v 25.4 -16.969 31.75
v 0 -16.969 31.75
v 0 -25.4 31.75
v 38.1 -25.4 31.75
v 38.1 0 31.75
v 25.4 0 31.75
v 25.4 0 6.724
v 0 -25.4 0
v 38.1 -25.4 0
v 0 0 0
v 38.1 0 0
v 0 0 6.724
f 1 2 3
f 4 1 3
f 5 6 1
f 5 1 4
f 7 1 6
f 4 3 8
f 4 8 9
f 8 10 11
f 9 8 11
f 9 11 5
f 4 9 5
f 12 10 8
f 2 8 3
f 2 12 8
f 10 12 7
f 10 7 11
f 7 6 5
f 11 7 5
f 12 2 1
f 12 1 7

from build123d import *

# Parameters (mm, degrees)
F0_W     = 38.1
F0_H     = 31.75
F1_DEPTH = 25.4
F3_DEPTH = 25.4
F4_DEPTH = 0.0543467271


with BuildPart() as f1:
    # F0 (on Front) → F1 (new body)
    with BuildSketch(Plane.XZ):
        with Locations((19.05, 15.875)):
            Rectangle(F0_W, F0_H)
    extrude(amount=F1_DEPTH)

    # F2 (on Right) → F3 (cut)
    with BuildSketch(Plane.YZ):
        Polygon((0, 31.696639955), (-17.193024978, 32.0808403194), (0, 6.7235296592), align=None)
    extrude(amount=F3_DEPTH, mode=Mode.SUBTRACT)

    # F4 (cut, through all): a face of the model
    f4_faces = [f1.faces().sort_by_distance(p)[0] for p in [
        (12.7, -1.1939350803, 31.7233199775),
    ]]
    extrude(f4_faces, amount=-F4_DEPTH, mode=Mode.SUBTRACT)


solid = f1.part
